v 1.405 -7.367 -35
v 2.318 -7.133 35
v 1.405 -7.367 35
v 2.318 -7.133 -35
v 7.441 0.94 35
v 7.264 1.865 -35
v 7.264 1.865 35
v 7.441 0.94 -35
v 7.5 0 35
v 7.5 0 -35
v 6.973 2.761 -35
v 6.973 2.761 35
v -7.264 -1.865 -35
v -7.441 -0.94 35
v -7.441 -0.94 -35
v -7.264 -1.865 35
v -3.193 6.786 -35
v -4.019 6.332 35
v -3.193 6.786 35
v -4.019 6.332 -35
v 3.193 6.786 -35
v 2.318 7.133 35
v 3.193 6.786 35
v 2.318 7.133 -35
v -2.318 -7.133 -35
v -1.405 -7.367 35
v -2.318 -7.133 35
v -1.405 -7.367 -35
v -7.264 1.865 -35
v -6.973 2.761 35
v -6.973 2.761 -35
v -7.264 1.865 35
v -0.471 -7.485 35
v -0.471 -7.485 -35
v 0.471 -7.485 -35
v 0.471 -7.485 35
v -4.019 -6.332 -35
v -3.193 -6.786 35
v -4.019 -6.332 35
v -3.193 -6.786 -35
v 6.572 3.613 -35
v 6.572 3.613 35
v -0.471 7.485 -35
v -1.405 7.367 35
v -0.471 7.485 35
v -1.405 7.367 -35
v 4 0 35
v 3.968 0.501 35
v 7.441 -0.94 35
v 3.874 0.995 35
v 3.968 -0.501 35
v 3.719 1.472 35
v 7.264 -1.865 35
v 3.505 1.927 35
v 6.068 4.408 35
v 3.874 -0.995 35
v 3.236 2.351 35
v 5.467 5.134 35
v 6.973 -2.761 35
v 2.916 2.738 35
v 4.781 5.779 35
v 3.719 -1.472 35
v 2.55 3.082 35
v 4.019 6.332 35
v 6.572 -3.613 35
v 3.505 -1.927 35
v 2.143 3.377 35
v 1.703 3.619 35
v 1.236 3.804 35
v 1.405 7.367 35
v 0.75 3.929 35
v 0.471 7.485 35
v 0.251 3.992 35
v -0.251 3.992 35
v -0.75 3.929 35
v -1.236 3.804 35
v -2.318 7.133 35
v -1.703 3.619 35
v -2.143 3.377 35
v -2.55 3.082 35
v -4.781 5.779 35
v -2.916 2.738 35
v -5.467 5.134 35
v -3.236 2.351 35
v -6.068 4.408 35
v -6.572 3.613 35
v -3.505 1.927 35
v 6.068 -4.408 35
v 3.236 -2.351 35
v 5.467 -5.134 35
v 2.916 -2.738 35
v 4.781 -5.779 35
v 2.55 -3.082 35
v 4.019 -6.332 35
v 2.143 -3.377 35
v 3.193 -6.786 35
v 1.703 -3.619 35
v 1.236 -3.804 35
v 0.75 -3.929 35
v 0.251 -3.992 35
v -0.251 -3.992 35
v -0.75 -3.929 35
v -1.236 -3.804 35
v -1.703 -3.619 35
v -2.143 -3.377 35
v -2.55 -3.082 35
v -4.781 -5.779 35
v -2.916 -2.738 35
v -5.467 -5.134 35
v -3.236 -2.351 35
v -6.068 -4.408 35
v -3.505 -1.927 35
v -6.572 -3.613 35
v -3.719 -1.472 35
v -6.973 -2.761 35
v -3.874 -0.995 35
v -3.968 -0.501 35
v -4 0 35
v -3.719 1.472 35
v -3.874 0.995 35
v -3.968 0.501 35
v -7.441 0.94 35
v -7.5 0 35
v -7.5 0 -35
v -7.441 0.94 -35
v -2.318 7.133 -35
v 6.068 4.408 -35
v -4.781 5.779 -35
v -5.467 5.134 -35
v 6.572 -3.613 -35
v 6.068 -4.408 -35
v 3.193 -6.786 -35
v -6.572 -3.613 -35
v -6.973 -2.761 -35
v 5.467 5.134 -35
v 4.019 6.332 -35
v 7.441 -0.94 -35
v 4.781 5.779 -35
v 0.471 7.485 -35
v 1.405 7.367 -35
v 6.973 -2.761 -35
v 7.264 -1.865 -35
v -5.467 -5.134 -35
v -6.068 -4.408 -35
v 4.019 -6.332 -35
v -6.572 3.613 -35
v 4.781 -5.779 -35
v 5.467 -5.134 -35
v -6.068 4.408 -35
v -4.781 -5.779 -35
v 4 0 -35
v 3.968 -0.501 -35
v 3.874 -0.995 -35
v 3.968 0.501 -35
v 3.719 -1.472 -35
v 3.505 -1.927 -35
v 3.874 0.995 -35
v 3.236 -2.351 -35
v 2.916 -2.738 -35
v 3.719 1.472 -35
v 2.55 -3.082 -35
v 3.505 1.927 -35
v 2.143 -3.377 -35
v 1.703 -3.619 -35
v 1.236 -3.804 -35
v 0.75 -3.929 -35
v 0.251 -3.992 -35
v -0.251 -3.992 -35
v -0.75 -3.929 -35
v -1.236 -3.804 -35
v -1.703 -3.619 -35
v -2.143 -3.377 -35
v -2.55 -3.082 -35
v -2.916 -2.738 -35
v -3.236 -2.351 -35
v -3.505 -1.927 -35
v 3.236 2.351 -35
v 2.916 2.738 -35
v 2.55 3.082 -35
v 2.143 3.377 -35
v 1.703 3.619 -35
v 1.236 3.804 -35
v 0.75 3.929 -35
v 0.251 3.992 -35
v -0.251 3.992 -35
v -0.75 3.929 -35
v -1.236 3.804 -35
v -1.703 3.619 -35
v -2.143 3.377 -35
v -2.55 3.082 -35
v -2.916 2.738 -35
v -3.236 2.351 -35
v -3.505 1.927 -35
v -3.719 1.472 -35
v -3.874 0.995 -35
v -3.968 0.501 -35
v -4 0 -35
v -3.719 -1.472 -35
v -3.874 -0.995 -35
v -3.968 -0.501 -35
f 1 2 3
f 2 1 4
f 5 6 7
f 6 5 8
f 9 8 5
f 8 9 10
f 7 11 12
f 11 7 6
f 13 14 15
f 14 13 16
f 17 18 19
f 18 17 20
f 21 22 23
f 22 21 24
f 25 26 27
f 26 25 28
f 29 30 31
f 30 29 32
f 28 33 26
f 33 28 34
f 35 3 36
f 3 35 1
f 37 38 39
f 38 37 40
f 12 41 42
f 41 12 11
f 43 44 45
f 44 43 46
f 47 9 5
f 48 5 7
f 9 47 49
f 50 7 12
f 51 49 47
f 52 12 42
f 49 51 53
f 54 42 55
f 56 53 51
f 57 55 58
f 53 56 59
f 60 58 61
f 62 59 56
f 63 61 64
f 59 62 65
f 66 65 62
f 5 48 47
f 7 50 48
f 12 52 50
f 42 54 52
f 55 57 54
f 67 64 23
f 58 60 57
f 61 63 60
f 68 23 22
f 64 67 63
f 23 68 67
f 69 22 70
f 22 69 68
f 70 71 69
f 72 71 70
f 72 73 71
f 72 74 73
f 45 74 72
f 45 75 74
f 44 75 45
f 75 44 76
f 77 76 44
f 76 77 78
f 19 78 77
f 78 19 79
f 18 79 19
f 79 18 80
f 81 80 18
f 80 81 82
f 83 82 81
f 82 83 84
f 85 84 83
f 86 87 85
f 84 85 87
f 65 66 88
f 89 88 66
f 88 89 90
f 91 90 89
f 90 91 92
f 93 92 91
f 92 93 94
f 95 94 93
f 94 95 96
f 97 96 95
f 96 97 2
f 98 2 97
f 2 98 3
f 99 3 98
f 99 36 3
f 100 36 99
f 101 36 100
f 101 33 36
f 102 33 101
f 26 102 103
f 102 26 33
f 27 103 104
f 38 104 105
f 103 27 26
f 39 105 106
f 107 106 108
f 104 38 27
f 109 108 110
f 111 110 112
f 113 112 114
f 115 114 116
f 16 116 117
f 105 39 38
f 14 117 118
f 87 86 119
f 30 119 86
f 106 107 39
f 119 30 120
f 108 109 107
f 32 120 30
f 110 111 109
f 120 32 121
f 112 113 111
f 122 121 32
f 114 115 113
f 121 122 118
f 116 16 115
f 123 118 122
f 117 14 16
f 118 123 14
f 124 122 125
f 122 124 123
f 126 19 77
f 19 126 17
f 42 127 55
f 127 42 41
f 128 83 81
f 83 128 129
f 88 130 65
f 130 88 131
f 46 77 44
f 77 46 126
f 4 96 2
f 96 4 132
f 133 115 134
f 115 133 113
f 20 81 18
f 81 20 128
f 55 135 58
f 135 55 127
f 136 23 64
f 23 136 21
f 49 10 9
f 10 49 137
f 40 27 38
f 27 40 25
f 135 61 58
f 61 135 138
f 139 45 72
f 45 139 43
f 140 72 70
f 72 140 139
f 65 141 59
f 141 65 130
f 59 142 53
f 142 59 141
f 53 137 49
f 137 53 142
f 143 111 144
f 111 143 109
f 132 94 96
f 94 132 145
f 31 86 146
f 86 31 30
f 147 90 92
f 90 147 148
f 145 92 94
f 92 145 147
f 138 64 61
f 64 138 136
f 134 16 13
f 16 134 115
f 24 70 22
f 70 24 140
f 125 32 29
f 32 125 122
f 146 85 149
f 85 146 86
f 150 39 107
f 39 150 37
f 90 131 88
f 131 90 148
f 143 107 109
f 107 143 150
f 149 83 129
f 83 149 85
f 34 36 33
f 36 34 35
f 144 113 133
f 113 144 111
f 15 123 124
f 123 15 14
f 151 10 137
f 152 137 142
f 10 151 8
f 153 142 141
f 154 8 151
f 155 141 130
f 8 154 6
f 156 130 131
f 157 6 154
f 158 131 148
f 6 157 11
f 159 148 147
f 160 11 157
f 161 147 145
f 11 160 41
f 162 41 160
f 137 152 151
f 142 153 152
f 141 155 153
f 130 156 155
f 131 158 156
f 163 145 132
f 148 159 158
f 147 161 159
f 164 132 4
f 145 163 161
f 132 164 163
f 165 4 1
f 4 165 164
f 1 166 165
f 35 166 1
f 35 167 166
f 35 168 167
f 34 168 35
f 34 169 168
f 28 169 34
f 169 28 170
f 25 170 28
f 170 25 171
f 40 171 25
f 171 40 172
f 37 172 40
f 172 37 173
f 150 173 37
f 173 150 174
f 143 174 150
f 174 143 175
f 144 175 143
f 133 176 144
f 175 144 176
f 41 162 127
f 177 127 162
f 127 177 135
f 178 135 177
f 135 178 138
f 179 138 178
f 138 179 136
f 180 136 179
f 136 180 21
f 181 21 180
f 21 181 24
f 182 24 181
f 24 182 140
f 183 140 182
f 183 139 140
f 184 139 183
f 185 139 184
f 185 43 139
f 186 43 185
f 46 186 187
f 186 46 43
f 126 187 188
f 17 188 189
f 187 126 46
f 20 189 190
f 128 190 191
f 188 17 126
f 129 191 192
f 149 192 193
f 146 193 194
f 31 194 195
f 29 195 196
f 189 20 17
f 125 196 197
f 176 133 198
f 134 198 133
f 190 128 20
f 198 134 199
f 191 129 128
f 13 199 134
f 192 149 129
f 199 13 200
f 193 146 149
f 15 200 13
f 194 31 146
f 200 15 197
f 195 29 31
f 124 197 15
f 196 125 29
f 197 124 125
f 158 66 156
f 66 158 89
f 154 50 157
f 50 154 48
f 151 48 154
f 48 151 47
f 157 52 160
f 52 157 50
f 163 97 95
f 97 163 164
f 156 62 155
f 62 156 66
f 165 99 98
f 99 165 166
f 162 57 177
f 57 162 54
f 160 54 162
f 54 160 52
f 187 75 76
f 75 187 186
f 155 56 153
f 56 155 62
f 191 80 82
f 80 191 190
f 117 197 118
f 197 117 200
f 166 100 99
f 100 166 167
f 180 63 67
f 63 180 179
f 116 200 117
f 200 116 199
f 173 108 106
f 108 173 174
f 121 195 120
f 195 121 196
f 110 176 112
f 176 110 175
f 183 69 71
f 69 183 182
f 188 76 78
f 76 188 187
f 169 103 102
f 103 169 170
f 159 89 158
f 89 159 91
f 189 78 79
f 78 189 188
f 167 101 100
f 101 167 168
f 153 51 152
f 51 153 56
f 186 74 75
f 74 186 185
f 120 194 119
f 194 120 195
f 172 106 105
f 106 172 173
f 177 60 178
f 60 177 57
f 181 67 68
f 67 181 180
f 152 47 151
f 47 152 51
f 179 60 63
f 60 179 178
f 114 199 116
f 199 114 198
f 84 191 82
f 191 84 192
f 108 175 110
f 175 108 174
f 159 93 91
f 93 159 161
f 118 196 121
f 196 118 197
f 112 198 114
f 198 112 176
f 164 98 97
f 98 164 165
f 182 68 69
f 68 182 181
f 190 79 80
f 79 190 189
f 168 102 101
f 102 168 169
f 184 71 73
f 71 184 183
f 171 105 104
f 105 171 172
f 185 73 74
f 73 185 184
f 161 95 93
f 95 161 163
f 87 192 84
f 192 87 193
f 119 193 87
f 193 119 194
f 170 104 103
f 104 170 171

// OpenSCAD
$fn = 50;


difference() {
	union() {
		translate(v = [0, 0, -35.0000000000]) {
			cylinder(h = 70, r = 7.5000000000);
		}
	}
	union() {
		translate(v = [0, 0, -100.0000000000]) {
			cylinder(h = 200, r = 4.0000000000);
		}
	}
}
